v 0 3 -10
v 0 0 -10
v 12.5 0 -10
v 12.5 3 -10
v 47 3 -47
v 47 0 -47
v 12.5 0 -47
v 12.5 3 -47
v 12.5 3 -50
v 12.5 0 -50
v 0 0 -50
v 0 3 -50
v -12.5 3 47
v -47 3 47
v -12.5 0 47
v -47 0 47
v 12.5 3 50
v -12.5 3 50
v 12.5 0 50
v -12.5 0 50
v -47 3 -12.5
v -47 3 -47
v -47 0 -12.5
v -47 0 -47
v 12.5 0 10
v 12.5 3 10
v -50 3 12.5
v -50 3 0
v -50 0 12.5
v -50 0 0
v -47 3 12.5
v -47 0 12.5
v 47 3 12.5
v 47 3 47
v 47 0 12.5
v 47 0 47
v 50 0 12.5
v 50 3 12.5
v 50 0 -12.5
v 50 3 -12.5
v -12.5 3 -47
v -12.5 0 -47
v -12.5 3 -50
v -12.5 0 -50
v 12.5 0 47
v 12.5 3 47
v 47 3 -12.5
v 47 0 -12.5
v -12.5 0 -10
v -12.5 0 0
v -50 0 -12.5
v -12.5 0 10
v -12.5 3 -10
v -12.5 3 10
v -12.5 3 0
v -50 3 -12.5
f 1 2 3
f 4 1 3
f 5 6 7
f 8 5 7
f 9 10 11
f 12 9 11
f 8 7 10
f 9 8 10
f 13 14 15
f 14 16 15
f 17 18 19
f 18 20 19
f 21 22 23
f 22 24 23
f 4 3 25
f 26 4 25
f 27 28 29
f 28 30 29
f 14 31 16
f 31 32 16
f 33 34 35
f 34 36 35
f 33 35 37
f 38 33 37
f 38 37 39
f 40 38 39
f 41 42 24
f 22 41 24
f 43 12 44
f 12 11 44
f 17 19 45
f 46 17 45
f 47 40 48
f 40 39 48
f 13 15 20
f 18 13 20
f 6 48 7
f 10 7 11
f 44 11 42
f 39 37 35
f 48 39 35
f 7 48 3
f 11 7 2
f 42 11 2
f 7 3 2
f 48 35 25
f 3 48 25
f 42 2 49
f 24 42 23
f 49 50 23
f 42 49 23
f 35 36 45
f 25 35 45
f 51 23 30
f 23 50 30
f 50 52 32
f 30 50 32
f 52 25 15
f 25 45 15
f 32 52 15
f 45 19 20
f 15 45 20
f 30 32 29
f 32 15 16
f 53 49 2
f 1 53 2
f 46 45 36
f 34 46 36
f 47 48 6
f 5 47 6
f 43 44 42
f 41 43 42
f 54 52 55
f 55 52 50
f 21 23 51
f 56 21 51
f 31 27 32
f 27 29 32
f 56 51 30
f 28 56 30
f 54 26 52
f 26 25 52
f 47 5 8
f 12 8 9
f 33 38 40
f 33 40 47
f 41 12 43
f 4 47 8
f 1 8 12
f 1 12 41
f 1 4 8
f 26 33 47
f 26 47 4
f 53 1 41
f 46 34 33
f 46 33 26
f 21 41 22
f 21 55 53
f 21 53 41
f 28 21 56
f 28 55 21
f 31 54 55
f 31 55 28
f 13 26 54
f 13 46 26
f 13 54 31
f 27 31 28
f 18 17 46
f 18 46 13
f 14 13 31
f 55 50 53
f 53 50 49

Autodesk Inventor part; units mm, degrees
ref_plane "YZ Plane" through (0, 0, 0) normal (1, 0, 0) x (0, 1, 0)
ref_plane "XZ Plane" through (0, 0, 0) normal (0, 1, 0) x (-1, 0, 0)
ref_plane "XY Plane" through (0, 0, 0) normal (0, 0, 1) x (1, 0, 0)
sketch "Sketch1" plane through (0, 0, 0) normal (0, 1, 0) x (-1, 0, 0)
  line L0 (0, 0) -> (50, 0) construction
  line L1 (0, 0) -> (-50, 0) construction
  line L2 (0, 0) -> (0, 50) construction
  line L3 (0, 0) -> (0, -50) construction
  line L4 (0, -50) -> (12.5, -50)
  line L5 (12.5, -50) -> (12.5, -47)
  line L6 (12.5, -47) -> (47, -47)
  line L7 (47, -47) -> (47, -12.5)
  line L8 (47, -12.5) -> (50, -12.5)
  line L9 (50, -12.5) -> (50, 0)
  line L10 (50, 0) -> (50, 12.5)
  line L11 (50, 12.5) -> (47, 12.5)
  line L12 (47, 12.5) -> (47, 47)
  line L13 (47, 47) -> (12.5, 47)
  line L14 (12.5, 47) -> (12.5, 50)
  line L15 (12.5, 50) -> (-12.5, 50)
  line L16 (-12.5, 50) -> (-12.5, 47)
  line L17 (-12.5, 47) -> (-47, 47)
  line L18 (-47, 47) -> (-47, 12.5)
  line L19 (-47, 12.5) -> (-50, 12.5)
  line L20 (-50, 12.5) -> (-50, -12.5)
  line L21 (-50, -12.5) -> (-47, -12.5)
  line L22 (-47, -12.5) -> (-47, -47)
  line L23 (-47, -47) -> (-12.5, -47)
  line L24 (-12.5, -47) -> (-12.5, -50)
  line L25 (-12.5, -50) -> (0, -50)
  line L26 (0, 0) -> (0, 10) construction
  line L27 (0, 0) -> (0, -10)
  line L28 (0, 0) -> (12.5, 0) construction
  line L29 (12.5, 0) -> (12.5, -10)
  line L30 (12.5, -10) -> (-12.5, -10)
  line L31 (-12.5, -10) -> (-12.5, 10)
  line L32 (-12.5, 10) -> (12.5, 10)
  line L33 (12.5, 10) -> (12.5, 0)
  dimension "d0" = 50
  dimension "d1" = 50
  dimension "d2" = 50
  dimension "d3" = 50
  dimension "d4" = 12.5
  dimension "d5" = 3
  dimension "d6" = 34.5
  dimension "d7" = 34.5
  dimension "d8" = 3
  dimension "d9" = 12.5
  dimension "d10" = 3
  dimension "d11" = 34.5
  dimension "d12" = 34.5
  dimension "d13" = 3
  dimension "d14" = 25
  dimension "d15" = 3
  dimension "d16" = 34.5
  dimension "d17" = 34.5
  dimension "d18" = 3
  dimension "d19" = 25
  dimension "d20" = 3
  dimension "d21" = 34.5
  dimension "d22" = 34.5
  dimension "d23" = 3
  dimension "d24" = 10
  dimension "d25" = 10
  dimension "d26" = 12.5
  dimension "d27" = 10
  dimension "d28" = 25
  dimension "d29" = 20
  dimension "d30" = 25
extrude "Extrusion1" add sketch "Sketch1" along normal blind 3
properties part number "bolongan"
